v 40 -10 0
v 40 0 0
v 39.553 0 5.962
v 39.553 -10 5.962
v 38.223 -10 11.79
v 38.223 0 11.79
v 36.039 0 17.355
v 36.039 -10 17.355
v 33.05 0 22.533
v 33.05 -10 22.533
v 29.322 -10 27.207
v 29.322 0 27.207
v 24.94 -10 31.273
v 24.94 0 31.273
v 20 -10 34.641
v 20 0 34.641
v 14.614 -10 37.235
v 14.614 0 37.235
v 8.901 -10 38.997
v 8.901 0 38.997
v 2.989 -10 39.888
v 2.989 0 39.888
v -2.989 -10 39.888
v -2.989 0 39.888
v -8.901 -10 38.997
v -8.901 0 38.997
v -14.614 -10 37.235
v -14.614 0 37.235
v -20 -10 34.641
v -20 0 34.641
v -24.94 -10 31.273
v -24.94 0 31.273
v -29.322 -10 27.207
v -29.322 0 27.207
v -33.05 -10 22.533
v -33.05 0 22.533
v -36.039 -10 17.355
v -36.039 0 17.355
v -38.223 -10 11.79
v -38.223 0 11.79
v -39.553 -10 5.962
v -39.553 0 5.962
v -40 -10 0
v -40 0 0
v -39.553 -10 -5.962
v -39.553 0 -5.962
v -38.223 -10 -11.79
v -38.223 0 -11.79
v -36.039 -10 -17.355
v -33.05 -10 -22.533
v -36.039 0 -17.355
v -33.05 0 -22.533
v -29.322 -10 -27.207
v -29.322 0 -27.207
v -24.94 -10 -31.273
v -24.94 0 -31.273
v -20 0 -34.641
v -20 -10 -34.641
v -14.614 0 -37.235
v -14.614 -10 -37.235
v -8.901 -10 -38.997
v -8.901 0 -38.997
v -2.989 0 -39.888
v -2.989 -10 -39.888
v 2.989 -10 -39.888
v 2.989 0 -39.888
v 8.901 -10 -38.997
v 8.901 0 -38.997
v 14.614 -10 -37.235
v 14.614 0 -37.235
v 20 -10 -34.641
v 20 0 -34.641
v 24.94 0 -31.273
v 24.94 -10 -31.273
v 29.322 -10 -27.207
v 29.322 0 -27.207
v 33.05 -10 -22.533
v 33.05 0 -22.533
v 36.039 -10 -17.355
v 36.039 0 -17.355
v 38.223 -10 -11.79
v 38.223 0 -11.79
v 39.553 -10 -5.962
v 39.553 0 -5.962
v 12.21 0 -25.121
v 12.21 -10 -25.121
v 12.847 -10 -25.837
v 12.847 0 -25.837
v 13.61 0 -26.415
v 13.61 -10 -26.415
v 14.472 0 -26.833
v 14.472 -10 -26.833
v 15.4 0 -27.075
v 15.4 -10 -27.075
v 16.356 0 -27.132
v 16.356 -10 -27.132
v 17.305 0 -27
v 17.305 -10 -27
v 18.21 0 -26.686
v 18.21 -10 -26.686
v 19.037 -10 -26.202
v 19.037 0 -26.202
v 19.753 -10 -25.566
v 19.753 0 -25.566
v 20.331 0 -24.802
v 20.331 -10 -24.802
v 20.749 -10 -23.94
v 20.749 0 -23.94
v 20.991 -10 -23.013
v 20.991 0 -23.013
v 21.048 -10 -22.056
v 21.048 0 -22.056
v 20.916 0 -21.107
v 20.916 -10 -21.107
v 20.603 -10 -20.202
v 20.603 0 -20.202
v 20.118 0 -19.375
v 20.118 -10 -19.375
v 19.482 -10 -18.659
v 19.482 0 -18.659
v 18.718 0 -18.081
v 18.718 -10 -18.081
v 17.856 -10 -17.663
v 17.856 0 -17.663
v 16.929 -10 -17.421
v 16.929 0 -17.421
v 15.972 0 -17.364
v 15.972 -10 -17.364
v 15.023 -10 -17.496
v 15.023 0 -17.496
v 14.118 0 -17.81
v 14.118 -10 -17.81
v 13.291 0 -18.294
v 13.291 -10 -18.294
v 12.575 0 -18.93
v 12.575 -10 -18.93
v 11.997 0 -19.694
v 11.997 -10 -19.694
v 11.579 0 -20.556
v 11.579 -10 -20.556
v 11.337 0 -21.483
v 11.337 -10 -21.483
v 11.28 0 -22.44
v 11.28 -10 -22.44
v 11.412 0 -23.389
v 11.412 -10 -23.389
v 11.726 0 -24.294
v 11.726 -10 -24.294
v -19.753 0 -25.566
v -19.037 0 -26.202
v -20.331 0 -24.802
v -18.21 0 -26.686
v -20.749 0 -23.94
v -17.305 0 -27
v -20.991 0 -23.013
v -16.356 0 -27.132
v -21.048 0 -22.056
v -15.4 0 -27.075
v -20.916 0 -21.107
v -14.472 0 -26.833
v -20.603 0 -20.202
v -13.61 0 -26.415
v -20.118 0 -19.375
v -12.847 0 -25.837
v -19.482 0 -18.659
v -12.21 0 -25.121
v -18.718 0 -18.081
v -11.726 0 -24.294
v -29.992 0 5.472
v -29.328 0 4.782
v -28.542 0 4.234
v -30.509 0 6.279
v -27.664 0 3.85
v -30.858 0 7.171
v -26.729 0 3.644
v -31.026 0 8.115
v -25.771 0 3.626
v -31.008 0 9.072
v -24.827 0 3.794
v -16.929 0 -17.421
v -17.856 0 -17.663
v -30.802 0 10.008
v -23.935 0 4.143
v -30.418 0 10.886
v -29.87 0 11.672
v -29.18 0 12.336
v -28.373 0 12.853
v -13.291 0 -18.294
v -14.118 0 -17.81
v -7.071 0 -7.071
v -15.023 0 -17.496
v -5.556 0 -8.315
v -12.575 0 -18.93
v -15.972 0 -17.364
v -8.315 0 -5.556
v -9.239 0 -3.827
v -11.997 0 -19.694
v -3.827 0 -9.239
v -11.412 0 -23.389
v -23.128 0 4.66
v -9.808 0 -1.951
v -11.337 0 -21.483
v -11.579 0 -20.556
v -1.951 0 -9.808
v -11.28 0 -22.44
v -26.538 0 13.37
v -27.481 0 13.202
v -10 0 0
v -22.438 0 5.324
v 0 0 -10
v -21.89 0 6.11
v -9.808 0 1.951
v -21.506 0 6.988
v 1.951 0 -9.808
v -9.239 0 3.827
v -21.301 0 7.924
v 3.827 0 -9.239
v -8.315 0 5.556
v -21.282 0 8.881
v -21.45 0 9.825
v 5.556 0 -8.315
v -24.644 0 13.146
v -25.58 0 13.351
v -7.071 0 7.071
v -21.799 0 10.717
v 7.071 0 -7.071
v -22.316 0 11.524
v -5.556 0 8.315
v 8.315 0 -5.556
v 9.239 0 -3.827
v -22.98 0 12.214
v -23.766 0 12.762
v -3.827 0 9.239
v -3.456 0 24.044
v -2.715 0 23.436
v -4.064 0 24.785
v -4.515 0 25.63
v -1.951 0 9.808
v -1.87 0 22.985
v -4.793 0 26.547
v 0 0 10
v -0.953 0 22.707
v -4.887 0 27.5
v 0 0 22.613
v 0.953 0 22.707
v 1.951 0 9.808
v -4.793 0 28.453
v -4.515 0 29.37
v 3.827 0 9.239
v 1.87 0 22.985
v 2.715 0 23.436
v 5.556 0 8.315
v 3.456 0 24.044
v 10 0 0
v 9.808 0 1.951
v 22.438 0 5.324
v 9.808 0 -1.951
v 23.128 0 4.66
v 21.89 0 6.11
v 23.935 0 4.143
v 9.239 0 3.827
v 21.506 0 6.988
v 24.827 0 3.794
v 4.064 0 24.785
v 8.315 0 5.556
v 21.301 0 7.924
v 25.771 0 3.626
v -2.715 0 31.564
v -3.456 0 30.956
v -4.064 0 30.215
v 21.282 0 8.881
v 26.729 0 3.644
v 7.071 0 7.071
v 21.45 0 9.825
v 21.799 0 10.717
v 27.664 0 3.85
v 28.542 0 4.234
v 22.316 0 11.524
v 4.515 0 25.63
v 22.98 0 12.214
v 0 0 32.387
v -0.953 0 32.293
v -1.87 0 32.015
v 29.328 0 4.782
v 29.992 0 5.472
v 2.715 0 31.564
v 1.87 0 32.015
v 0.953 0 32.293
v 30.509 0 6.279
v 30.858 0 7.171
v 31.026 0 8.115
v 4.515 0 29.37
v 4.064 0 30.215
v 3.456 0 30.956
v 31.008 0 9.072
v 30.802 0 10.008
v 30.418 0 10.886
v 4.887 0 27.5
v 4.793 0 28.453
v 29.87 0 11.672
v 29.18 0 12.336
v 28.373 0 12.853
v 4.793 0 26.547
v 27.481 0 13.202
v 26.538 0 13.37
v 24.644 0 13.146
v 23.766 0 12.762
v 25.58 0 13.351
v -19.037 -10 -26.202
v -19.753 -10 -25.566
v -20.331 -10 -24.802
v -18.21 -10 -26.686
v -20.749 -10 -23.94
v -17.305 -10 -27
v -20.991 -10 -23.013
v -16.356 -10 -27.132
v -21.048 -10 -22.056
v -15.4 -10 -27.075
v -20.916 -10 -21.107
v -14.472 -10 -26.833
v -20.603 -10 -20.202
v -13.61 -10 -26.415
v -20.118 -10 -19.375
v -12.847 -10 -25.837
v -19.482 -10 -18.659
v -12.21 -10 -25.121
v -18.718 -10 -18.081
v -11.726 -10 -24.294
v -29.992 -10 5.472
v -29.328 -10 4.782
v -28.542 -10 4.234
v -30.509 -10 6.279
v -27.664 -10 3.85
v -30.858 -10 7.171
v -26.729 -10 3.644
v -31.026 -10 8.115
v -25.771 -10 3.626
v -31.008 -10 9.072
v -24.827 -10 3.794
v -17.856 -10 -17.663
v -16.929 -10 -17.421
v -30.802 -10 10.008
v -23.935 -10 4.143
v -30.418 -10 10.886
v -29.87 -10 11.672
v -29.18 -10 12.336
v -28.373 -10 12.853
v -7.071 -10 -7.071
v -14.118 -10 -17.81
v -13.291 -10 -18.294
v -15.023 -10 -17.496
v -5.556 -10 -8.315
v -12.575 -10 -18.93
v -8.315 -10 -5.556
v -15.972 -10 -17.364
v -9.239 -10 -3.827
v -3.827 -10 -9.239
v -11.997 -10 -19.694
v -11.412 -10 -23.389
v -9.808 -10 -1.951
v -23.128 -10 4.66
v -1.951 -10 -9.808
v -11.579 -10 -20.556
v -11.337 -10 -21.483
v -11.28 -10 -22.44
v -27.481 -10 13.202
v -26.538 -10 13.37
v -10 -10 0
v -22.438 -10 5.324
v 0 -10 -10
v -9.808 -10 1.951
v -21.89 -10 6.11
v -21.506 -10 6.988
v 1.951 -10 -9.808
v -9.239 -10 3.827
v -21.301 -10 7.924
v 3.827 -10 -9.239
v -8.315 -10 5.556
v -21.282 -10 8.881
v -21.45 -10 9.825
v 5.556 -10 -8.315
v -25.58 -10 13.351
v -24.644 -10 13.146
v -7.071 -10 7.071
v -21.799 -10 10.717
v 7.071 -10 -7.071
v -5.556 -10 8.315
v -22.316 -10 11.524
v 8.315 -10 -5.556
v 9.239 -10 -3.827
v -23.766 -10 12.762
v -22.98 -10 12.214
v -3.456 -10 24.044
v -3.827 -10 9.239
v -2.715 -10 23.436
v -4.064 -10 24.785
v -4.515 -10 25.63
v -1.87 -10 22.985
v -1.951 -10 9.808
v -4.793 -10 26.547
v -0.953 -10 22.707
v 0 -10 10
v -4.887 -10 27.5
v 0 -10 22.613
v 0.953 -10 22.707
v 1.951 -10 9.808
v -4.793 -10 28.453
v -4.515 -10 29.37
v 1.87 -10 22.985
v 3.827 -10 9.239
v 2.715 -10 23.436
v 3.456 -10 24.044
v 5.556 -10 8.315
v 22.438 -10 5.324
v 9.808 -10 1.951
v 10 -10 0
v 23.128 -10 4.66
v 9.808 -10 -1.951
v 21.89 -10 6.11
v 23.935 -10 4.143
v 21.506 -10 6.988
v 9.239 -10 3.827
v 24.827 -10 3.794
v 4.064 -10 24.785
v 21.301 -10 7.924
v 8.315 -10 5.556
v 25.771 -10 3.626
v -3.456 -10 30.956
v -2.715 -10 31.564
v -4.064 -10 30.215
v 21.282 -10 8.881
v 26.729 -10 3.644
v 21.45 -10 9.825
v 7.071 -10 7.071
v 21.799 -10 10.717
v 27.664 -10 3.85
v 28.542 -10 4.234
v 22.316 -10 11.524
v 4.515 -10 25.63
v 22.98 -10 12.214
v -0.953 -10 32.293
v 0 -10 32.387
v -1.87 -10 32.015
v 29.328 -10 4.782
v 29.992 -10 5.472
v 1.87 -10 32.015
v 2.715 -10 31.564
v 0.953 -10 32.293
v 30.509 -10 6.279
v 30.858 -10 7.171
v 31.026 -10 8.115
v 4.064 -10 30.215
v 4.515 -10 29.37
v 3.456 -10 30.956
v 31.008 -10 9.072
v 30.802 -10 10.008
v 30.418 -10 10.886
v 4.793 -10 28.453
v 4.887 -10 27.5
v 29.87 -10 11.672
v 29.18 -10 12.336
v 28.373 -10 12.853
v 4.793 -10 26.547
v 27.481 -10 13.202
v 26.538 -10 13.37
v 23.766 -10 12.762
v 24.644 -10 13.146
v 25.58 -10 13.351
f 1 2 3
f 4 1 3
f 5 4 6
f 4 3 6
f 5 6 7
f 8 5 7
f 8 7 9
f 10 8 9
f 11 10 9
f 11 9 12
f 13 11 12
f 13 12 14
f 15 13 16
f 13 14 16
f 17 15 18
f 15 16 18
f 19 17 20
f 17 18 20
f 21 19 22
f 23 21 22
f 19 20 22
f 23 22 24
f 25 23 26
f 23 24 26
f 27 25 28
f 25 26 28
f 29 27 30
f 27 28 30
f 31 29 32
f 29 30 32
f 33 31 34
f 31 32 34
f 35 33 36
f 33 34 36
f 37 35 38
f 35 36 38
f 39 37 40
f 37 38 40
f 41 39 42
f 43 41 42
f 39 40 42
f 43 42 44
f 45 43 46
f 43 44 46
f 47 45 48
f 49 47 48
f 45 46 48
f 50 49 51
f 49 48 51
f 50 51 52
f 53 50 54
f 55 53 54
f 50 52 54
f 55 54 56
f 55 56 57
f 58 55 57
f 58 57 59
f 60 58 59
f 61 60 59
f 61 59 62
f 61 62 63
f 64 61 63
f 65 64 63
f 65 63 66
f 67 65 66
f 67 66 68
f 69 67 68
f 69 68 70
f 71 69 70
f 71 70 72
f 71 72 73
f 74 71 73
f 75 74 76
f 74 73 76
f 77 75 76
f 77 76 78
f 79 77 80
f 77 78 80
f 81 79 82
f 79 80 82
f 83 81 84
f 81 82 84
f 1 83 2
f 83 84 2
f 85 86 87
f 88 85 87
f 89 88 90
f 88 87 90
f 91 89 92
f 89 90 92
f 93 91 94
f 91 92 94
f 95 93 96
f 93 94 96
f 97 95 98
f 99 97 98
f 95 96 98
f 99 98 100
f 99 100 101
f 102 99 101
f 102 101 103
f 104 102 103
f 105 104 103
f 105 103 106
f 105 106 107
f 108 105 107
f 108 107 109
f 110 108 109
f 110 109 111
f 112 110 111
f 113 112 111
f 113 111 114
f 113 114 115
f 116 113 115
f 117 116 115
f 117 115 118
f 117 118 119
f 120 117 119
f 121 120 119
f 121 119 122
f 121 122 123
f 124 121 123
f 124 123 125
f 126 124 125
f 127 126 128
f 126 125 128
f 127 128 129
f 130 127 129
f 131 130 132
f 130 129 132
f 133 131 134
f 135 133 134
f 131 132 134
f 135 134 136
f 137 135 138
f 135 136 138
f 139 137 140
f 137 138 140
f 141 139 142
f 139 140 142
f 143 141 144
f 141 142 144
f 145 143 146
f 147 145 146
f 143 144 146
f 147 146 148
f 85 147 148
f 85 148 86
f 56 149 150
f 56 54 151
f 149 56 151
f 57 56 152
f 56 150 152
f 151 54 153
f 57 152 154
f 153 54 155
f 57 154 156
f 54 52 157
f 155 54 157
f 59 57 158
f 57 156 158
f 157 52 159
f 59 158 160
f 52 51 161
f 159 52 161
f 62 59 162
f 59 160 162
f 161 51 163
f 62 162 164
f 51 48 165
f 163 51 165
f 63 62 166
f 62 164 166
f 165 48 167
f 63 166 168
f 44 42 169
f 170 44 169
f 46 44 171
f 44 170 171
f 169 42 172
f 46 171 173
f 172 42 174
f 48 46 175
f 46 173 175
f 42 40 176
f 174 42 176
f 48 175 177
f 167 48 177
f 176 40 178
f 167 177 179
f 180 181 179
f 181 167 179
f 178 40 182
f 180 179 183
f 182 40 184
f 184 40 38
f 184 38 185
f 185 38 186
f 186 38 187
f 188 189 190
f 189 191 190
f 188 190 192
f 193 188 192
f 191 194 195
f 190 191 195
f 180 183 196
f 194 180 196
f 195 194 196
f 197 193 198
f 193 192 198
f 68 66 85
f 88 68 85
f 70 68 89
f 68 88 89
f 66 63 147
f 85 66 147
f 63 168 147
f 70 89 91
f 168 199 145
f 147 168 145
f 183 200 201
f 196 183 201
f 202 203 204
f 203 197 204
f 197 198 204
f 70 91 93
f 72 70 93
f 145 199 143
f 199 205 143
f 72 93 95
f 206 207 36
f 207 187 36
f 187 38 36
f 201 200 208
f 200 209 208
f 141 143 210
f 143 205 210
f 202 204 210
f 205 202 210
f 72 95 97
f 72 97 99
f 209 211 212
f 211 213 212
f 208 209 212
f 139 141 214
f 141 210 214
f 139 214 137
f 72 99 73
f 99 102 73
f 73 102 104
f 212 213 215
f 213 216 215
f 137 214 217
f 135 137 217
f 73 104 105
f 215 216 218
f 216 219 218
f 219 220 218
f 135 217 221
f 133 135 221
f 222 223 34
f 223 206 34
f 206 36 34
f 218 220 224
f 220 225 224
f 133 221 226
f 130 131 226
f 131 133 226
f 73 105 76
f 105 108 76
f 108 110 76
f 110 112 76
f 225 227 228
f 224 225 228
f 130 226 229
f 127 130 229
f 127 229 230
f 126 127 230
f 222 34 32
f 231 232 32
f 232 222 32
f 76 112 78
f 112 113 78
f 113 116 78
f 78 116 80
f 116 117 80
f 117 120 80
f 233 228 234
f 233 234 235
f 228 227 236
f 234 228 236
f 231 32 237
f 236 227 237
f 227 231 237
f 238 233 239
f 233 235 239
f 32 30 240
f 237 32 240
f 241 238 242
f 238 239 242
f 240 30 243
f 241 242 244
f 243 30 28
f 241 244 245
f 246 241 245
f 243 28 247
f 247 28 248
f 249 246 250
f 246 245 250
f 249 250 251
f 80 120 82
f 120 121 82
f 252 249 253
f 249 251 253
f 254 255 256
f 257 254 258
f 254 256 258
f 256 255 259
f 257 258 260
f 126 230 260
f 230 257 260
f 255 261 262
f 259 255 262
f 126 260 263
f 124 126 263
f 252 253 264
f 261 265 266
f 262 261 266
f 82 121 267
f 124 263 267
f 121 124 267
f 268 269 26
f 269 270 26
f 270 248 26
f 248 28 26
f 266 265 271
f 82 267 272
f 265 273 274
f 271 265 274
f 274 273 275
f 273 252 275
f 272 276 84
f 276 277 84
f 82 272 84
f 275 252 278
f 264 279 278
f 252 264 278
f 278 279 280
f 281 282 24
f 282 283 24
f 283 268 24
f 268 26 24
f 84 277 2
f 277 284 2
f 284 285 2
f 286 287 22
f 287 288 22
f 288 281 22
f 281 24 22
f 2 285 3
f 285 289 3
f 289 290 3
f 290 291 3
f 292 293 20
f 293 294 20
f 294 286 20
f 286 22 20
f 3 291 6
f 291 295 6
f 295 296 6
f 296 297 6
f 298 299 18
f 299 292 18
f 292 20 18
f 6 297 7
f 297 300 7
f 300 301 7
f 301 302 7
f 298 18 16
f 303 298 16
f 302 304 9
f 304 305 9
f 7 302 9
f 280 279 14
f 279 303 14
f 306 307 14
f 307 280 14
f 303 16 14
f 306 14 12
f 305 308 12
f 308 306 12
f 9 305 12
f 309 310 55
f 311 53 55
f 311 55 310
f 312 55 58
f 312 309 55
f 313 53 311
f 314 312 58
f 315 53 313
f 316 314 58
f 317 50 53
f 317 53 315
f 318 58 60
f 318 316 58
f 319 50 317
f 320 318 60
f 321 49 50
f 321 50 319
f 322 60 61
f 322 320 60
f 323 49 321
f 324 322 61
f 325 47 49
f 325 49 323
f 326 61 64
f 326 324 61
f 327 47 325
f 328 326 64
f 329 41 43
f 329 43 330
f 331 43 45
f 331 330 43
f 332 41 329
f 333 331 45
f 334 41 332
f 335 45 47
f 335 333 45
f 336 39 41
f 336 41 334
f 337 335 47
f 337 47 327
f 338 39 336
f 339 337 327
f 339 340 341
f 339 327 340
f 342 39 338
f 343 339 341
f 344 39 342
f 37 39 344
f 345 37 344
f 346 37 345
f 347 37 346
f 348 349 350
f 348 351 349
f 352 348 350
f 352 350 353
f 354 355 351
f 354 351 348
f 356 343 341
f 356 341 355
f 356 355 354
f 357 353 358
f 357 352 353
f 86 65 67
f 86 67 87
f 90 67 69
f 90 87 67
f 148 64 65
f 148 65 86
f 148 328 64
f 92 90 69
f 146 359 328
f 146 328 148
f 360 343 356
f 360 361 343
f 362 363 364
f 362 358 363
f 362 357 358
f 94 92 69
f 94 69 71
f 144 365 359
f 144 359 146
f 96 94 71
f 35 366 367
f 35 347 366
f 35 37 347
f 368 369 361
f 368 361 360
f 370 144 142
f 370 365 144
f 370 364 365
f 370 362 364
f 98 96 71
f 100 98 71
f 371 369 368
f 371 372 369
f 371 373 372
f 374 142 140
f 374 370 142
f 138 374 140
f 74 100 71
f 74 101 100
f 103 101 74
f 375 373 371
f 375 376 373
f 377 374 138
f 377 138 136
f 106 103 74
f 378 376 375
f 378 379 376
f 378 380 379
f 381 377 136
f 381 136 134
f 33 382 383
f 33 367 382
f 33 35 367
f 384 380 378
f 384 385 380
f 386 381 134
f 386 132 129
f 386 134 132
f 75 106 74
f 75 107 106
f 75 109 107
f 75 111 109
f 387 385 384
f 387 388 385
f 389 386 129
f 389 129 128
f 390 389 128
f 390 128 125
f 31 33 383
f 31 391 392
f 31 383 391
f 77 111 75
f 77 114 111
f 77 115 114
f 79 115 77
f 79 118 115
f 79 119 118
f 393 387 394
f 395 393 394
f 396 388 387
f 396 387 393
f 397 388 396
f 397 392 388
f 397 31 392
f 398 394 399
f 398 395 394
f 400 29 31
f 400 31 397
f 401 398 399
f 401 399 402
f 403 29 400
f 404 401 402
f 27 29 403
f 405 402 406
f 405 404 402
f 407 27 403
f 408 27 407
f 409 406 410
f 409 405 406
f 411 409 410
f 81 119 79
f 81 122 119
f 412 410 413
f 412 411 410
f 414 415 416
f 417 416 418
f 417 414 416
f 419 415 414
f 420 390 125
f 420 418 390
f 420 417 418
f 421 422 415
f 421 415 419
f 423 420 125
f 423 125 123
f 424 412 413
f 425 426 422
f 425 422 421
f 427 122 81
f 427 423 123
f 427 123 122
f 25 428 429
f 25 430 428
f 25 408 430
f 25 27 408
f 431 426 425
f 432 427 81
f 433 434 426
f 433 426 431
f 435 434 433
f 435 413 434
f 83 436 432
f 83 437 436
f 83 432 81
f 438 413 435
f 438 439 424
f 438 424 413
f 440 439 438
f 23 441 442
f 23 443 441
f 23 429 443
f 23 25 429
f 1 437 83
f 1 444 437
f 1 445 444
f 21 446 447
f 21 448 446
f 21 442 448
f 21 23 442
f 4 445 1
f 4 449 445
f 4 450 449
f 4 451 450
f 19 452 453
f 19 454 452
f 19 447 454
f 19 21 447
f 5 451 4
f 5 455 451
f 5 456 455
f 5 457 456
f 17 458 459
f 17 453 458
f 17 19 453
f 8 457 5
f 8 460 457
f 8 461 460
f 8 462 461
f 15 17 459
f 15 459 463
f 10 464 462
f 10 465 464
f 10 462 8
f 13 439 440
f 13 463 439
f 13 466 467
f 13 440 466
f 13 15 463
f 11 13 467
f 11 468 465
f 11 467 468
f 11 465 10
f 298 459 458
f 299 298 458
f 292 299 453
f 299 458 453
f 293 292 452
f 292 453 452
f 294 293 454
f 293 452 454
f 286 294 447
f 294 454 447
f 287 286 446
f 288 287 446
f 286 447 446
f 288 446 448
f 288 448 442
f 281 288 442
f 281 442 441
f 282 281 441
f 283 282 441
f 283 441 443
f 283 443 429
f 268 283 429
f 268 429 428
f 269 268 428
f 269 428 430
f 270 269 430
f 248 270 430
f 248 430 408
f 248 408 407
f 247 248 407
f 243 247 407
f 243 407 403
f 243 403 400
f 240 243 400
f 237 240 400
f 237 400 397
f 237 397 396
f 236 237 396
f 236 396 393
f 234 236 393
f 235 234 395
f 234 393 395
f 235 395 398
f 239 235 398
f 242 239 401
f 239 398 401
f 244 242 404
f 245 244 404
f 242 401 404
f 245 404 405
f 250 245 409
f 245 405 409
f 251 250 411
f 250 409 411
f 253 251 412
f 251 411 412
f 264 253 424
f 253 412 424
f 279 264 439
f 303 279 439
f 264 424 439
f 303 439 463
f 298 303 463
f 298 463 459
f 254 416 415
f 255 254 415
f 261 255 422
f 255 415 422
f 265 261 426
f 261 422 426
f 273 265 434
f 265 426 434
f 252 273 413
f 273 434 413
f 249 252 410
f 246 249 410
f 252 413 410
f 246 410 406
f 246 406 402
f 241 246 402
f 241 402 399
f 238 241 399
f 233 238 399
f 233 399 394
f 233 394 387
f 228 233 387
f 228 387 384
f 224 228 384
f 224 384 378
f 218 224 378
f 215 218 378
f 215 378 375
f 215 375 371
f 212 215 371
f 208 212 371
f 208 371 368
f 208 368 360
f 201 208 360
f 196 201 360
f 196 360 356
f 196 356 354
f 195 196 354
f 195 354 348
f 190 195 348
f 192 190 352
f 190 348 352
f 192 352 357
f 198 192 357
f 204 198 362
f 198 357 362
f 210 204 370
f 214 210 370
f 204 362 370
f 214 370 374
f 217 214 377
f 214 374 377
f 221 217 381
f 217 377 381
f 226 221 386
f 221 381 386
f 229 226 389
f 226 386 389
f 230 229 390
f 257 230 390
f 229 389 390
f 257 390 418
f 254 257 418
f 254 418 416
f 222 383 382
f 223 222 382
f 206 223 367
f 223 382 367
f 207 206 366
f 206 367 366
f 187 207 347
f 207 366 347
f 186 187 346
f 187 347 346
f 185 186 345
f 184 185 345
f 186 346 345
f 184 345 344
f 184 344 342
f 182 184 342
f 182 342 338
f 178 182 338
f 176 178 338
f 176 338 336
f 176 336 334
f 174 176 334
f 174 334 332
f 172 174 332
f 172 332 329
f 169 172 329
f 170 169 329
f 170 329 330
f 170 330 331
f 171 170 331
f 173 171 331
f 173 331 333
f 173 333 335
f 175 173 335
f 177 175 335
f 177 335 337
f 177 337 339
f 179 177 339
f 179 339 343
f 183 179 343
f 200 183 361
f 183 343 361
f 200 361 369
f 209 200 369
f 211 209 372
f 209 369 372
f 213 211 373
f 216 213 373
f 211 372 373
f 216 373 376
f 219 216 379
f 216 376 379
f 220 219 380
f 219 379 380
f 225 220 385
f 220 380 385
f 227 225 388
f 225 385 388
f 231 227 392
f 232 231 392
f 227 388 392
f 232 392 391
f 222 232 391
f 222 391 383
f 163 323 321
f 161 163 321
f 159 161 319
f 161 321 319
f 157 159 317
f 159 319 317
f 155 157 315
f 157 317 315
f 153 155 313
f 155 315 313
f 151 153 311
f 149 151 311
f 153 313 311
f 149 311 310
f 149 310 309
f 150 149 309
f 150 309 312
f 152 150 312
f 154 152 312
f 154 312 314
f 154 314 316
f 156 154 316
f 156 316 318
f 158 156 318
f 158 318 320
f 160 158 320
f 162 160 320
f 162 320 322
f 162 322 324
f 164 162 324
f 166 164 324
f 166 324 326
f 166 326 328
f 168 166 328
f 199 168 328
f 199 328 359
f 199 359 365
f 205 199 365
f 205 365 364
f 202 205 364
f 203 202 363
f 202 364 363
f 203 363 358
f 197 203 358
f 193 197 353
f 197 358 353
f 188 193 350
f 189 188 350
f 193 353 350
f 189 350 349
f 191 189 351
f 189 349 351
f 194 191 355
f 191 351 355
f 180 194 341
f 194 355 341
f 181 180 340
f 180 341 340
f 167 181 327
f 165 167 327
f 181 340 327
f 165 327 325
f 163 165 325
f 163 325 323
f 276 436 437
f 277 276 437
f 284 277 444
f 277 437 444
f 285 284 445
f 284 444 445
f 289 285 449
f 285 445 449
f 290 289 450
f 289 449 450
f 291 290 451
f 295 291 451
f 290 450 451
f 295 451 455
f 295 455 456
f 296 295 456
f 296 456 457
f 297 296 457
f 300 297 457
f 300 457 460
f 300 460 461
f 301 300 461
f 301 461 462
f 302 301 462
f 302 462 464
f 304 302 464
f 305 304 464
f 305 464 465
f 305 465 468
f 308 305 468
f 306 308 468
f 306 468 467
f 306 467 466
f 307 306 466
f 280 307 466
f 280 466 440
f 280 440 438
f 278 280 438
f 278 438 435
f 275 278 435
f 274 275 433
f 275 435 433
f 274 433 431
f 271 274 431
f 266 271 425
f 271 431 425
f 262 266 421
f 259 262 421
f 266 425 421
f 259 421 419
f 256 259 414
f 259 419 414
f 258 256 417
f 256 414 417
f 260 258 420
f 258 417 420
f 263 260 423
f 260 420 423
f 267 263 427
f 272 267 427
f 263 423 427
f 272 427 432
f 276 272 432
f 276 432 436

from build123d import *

# Parameters (mm, degrees)
F0_R            = 40
F1_DEPTH        = 10
F2_R            = 4.8873689042
F3_DEPTH        = 25
F3_COPIES_COUNT = 5
F4_R            = 10
F5_DEPTH        = 25


# Not quite as in the source:
# - a pattern or mirror of a feature is missing from the dataset's text; its kind, count and spacing are read off the source's solid


with BuildPart() as f1:
    # F0 (on Front) → F1 (new body)
    with BuildSketch(Plane.XZ):
        Circle(F0_R)
    extrude(amount=F1_DEPTH)

    # F2 (on face) → F3 (cut)
    with BuildSketch(Plane.XZ.offset(10)):
        with Locations((0, 27.5)):
            Circle(F2_R)
    f3 = extrude(amount=-F3_DEPTH, mode=Mode.SUBTRACT)

    # F3_copies: F3 ×5 about axis
    f3_copies_axis = Axis((0, 0, 0), (0, 1, 0))
    for i in range(1, F3_COPIES_COUNT):
        add(f3.rotate(f3_copies_axis, i * 360 / F3_COPIES_COUNT), mode=Mode.SUBTRACT)

    # F4 (on face) → F5 (cut)
    with BuildSketch(Plane.XZ.offset(10)):
        Circle(F4_R)
    extrude(amount=-F5_DEPTH, mode=Mode.SUBTRACT)


solid = f1.part
